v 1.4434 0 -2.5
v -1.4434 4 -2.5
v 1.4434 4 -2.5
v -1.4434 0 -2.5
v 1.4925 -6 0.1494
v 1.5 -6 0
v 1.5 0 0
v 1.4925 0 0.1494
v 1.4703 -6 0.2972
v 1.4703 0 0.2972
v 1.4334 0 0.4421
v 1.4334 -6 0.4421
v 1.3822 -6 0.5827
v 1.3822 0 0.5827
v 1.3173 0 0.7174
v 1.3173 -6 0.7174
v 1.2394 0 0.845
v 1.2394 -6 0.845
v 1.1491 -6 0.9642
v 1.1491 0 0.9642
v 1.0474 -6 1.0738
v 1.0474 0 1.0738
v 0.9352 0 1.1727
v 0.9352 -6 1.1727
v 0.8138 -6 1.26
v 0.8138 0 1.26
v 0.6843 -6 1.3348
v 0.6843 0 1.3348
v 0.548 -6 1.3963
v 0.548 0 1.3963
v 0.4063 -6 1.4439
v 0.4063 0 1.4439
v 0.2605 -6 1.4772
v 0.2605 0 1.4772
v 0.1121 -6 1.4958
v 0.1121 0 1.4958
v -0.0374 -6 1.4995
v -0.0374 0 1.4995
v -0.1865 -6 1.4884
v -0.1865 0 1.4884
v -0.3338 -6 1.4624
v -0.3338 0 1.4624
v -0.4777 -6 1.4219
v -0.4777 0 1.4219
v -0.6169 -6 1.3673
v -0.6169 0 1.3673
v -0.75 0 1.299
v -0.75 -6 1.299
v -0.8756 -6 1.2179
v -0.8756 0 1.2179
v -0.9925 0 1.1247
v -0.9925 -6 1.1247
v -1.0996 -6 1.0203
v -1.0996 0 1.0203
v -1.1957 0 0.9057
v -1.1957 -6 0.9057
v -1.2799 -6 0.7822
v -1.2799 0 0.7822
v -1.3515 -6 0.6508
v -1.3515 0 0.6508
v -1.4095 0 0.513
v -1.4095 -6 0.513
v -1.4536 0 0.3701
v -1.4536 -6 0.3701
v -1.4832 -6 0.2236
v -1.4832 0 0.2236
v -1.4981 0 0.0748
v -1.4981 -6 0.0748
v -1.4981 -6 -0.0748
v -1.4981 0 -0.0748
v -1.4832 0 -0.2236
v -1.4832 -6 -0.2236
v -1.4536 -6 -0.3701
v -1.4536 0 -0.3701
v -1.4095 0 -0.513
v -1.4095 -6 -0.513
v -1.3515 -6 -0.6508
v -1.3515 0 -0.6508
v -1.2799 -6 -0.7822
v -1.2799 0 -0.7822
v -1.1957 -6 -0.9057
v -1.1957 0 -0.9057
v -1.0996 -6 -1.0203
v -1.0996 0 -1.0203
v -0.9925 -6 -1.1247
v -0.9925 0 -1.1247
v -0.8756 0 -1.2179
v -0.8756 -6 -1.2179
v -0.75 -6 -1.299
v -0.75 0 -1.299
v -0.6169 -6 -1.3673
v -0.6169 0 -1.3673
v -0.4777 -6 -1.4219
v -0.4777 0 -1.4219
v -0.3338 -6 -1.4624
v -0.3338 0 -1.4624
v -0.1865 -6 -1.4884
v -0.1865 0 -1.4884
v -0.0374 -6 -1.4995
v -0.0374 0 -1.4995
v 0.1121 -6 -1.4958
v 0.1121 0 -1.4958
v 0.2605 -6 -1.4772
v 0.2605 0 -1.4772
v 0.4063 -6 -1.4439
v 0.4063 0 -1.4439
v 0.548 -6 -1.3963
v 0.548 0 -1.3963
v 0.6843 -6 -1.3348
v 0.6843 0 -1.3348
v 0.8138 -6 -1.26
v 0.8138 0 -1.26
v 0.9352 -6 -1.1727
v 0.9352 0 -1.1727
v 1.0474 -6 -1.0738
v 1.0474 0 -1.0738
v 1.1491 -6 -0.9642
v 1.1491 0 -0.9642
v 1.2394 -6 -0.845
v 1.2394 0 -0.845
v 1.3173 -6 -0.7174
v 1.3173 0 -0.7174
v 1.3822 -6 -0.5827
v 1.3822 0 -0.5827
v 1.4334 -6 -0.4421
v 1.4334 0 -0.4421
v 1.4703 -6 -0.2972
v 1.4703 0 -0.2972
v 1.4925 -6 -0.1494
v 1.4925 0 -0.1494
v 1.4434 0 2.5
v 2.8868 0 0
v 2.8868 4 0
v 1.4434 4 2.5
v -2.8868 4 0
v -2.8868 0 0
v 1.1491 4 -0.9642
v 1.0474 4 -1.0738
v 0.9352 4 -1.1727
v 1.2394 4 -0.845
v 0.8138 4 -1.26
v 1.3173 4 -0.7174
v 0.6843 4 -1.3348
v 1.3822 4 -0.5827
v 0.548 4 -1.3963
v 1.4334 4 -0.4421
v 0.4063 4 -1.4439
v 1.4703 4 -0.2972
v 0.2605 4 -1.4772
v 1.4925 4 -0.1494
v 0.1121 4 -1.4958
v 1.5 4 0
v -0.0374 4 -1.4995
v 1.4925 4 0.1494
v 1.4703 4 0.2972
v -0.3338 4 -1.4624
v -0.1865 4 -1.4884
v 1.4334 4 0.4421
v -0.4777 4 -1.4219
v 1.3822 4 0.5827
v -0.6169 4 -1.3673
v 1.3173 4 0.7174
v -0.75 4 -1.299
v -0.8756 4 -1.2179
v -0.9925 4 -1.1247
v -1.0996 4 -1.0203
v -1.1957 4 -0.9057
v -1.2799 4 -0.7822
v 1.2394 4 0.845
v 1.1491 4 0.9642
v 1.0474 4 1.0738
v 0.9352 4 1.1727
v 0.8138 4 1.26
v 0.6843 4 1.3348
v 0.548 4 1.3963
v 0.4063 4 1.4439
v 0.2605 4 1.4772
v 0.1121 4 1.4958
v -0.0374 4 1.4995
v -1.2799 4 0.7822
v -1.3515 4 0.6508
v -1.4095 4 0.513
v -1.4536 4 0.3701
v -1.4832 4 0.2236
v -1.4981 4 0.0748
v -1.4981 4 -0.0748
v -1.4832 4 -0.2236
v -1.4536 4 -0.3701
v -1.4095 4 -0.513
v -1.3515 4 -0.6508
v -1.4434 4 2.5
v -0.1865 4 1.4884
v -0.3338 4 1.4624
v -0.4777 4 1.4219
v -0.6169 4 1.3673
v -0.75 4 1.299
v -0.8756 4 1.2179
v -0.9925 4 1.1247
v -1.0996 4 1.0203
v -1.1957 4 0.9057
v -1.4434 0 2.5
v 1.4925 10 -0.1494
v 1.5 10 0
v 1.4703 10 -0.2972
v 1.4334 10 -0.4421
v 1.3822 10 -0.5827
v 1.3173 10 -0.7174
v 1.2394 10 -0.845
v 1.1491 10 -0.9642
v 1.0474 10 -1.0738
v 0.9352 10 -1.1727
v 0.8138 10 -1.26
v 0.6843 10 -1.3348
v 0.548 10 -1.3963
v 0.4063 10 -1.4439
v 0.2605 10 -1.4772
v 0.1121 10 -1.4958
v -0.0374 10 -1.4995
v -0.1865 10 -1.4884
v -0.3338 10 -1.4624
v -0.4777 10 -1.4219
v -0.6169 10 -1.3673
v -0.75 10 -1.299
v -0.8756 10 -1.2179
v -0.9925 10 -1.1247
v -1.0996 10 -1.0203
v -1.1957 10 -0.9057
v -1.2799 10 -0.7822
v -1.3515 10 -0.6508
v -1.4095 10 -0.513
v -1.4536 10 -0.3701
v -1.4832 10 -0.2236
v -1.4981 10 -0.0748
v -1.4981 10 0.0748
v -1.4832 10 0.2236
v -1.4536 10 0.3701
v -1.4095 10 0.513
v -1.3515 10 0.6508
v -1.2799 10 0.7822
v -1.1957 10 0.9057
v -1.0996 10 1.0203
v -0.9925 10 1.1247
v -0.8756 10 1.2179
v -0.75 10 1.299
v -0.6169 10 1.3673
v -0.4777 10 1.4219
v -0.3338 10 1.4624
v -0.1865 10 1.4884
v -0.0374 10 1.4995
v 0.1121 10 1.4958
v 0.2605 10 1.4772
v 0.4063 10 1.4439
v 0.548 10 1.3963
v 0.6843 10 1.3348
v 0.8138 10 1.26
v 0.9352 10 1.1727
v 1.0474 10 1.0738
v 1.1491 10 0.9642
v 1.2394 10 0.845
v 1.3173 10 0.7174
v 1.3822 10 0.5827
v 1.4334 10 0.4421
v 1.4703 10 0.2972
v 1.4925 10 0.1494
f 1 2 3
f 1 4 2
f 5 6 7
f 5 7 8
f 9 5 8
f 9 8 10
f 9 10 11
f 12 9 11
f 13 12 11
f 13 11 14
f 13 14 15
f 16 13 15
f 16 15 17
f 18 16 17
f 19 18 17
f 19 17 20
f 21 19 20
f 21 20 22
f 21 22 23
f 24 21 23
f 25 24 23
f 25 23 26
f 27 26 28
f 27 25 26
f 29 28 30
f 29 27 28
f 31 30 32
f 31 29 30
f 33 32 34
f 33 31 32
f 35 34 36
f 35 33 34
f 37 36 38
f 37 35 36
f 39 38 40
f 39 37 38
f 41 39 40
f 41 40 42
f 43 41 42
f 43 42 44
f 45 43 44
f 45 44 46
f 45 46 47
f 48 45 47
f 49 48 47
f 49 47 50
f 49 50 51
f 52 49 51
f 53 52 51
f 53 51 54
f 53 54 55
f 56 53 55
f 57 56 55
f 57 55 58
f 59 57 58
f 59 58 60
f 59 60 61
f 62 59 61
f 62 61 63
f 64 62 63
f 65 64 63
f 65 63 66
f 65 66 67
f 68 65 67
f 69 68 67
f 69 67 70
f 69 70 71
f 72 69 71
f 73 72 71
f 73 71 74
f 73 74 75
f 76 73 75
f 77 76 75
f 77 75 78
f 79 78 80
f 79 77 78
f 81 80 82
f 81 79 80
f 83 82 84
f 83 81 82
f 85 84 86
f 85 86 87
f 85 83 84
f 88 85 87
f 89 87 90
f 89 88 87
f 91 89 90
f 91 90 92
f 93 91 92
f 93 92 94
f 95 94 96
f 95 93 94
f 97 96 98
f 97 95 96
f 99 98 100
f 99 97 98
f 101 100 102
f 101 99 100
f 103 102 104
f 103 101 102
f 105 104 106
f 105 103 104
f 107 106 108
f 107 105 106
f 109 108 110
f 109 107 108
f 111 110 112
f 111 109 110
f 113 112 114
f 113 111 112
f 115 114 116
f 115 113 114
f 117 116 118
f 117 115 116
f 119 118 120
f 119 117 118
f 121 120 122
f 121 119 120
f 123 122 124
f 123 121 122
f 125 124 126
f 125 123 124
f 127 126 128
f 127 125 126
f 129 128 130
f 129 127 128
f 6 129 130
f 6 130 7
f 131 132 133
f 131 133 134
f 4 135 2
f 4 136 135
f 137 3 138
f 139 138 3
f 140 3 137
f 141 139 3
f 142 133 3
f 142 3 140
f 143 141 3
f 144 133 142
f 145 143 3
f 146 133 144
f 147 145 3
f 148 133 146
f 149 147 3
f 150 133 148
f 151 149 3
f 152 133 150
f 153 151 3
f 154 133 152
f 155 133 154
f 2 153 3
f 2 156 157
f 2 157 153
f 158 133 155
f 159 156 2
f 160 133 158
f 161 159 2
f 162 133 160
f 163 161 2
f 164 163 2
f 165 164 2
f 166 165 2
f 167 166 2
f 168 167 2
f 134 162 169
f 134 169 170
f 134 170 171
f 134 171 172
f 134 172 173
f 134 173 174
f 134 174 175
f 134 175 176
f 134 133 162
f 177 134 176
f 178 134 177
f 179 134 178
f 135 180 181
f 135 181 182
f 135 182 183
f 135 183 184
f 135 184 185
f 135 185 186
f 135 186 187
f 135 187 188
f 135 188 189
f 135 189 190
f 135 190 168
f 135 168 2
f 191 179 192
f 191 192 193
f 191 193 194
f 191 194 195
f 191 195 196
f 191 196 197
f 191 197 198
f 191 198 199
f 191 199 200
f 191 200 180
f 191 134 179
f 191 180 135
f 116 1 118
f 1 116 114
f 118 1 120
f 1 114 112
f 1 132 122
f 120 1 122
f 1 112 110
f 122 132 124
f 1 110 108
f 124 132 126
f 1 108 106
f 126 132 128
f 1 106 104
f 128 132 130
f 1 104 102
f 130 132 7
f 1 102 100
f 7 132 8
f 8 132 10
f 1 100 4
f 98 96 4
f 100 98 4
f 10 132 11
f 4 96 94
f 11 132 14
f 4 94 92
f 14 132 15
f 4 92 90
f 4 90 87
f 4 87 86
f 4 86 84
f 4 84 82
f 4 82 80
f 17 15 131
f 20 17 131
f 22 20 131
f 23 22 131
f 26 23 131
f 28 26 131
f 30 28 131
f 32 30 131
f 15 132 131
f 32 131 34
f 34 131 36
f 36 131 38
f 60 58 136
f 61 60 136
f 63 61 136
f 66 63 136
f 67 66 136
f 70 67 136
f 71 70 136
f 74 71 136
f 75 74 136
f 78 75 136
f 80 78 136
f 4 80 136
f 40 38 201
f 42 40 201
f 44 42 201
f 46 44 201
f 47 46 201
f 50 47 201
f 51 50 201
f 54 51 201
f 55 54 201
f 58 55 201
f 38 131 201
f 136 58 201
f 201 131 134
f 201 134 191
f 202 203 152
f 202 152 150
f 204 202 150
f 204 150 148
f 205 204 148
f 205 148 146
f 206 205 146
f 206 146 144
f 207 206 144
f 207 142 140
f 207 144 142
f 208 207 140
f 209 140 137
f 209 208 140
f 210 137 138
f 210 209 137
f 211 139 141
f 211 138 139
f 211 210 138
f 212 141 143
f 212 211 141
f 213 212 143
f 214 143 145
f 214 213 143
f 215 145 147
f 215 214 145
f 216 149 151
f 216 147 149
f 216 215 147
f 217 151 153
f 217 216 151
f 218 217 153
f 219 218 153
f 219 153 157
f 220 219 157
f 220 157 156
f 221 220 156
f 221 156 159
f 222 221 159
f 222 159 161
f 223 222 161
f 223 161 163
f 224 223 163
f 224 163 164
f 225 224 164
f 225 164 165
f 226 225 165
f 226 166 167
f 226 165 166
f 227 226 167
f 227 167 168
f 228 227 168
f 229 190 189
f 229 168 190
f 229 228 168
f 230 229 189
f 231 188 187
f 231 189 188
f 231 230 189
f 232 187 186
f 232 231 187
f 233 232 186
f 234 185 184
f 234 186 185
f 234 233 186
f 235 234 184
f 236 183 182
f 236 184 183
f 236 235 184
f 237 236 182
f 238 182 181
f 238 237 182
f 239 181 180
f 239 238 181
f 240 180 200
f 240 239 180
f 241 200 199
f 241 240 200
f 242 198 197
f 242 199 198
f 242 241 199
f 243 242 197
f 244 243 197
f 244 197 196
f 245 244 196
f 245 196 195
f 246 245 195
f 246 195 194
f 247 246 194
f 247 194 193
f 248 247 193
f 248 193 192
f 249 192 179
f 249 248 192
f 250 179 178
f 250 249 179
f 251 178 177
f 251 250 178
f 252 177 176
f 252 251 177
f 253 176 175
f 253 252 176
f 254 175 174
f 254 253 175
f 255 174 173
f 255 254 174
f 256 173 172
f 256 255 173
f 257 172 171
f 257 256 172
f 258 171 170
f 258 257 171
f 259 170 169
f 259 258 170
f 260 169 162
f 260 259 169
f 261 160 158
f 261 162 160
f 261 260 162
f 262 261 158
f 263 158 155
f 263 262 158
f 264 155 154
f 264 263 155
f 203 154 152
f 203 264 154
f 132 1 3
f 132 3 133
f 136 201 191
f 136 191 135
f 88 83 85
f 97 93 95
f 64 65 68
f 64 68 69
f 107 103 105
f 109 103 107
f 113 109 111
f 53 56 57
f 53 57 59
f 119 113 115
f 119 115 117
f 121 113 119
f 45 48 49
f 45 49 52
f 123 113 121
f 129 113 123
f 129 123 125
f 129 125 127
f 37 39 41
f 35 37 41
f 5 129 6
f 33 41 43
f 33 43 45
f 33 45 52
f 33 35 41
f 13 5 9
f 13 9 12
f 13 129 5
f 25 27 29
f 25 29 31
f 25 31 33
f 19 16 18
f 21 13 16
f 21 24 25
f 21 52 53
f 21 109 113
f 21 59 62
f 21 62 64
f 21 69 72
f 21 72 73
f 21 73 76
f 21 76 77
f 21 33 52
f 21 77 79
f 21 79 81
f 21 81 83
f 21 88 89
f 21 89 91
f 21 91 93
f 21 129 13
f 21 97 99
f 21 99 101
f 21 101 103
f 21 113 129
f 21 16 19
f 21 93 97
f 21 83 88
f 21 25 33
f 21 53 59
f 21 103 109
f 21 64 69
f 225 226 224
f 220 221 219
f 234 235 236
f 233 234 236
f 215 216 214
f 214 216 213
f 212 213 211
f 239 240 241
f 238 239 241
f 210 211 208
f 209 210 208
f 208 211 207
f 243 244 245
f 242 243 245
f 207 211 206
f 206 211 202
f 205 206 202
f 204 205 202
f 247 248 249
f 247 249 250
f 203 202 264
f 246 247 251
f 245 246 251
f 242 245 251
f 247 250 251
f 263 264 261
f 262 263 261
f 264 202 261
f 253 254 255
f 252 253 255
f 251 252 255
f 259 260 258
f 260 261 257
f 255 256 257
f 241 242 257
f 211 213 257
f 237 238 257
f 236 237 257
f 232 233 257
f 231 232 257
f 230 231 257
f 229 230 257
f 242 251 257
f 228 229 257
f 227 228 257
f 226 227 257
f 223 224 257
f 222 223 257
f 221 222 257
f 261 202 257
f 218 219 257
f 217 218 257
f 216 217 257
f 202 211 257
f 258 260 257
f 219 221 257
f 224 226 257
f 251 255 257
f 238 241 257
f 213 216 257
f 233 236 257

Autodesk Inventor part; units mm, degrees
ref_plane "YZ Plane" through (0, 0, 0) normal (1, 0, 0) x (0, 1, 0)
ref_plane "XZ Plane" through (0, 0, 0) normal (0, 1, 0) x (-1, 0, 0)
ref_plane "XY Plane" through (0, 0, 0) normal (0, 0, 1) x (1, 0, 0)
sketch "草圖2" plane through (0, 0, 0) normal (0, 1, 0) x (-1, 0, 0)
  line L0 (-2.8868, 0) -> (-1.4434, 2.5)
  line L1 (-1.4434, 2.5) -> (1.4434, 2.5)
  line L2 (1.4434, 2.5) -> (2.8868, 0)
  line L3 (2.8868, 0) -> (1.4434, -2.5)
  line L4 (1.4434, -2.5) -> (-1.4434, -2.5)
  line L5 (-1.4434, -2.5) -> (-2.8868, 0)
  point P0 (0, 0)
  point P1 (0, 0)
  dimension "d2" = 5
extrude "擠出1" add sketch "草圖2" along normal blind 4
sketch "草圖3" plane through (0, 0, 0) normal (0, 0, 1) x (1, 0, 0)
  line L0 (1.4434, 4) -> (-1.4434, 4) projected
  line L1 (0, 4) -> (1.5, 4)
  line L2 (1.5, 4) -> (1.5, 10)
  line L3 (1.5, 10) -> (0, 10)
  line L4 (0, 10) -> (0, 4)
  line L5 (0, 17.268) -> (0, -3.3114)
  line L6 (0, 0) -> (1.5, 0)
  line L7 (1.5, 0) -> (1.5, -6)
  line L8 (1.5, -6) -> (0, -6)
  line L9 (0, -6) -> (0, 0)
  point P0 (0.75, 10)
  dimension "d5" = 3
  dimension "d6" = 6
  dimension "d8" = 6
revolve "迴轉1" add sketch "草圖3" angle 360 about axis through (0, 17.268, 0) along (0, -1, 0)
properties part number "copper_pillar_M3_L15" material "Copper"
